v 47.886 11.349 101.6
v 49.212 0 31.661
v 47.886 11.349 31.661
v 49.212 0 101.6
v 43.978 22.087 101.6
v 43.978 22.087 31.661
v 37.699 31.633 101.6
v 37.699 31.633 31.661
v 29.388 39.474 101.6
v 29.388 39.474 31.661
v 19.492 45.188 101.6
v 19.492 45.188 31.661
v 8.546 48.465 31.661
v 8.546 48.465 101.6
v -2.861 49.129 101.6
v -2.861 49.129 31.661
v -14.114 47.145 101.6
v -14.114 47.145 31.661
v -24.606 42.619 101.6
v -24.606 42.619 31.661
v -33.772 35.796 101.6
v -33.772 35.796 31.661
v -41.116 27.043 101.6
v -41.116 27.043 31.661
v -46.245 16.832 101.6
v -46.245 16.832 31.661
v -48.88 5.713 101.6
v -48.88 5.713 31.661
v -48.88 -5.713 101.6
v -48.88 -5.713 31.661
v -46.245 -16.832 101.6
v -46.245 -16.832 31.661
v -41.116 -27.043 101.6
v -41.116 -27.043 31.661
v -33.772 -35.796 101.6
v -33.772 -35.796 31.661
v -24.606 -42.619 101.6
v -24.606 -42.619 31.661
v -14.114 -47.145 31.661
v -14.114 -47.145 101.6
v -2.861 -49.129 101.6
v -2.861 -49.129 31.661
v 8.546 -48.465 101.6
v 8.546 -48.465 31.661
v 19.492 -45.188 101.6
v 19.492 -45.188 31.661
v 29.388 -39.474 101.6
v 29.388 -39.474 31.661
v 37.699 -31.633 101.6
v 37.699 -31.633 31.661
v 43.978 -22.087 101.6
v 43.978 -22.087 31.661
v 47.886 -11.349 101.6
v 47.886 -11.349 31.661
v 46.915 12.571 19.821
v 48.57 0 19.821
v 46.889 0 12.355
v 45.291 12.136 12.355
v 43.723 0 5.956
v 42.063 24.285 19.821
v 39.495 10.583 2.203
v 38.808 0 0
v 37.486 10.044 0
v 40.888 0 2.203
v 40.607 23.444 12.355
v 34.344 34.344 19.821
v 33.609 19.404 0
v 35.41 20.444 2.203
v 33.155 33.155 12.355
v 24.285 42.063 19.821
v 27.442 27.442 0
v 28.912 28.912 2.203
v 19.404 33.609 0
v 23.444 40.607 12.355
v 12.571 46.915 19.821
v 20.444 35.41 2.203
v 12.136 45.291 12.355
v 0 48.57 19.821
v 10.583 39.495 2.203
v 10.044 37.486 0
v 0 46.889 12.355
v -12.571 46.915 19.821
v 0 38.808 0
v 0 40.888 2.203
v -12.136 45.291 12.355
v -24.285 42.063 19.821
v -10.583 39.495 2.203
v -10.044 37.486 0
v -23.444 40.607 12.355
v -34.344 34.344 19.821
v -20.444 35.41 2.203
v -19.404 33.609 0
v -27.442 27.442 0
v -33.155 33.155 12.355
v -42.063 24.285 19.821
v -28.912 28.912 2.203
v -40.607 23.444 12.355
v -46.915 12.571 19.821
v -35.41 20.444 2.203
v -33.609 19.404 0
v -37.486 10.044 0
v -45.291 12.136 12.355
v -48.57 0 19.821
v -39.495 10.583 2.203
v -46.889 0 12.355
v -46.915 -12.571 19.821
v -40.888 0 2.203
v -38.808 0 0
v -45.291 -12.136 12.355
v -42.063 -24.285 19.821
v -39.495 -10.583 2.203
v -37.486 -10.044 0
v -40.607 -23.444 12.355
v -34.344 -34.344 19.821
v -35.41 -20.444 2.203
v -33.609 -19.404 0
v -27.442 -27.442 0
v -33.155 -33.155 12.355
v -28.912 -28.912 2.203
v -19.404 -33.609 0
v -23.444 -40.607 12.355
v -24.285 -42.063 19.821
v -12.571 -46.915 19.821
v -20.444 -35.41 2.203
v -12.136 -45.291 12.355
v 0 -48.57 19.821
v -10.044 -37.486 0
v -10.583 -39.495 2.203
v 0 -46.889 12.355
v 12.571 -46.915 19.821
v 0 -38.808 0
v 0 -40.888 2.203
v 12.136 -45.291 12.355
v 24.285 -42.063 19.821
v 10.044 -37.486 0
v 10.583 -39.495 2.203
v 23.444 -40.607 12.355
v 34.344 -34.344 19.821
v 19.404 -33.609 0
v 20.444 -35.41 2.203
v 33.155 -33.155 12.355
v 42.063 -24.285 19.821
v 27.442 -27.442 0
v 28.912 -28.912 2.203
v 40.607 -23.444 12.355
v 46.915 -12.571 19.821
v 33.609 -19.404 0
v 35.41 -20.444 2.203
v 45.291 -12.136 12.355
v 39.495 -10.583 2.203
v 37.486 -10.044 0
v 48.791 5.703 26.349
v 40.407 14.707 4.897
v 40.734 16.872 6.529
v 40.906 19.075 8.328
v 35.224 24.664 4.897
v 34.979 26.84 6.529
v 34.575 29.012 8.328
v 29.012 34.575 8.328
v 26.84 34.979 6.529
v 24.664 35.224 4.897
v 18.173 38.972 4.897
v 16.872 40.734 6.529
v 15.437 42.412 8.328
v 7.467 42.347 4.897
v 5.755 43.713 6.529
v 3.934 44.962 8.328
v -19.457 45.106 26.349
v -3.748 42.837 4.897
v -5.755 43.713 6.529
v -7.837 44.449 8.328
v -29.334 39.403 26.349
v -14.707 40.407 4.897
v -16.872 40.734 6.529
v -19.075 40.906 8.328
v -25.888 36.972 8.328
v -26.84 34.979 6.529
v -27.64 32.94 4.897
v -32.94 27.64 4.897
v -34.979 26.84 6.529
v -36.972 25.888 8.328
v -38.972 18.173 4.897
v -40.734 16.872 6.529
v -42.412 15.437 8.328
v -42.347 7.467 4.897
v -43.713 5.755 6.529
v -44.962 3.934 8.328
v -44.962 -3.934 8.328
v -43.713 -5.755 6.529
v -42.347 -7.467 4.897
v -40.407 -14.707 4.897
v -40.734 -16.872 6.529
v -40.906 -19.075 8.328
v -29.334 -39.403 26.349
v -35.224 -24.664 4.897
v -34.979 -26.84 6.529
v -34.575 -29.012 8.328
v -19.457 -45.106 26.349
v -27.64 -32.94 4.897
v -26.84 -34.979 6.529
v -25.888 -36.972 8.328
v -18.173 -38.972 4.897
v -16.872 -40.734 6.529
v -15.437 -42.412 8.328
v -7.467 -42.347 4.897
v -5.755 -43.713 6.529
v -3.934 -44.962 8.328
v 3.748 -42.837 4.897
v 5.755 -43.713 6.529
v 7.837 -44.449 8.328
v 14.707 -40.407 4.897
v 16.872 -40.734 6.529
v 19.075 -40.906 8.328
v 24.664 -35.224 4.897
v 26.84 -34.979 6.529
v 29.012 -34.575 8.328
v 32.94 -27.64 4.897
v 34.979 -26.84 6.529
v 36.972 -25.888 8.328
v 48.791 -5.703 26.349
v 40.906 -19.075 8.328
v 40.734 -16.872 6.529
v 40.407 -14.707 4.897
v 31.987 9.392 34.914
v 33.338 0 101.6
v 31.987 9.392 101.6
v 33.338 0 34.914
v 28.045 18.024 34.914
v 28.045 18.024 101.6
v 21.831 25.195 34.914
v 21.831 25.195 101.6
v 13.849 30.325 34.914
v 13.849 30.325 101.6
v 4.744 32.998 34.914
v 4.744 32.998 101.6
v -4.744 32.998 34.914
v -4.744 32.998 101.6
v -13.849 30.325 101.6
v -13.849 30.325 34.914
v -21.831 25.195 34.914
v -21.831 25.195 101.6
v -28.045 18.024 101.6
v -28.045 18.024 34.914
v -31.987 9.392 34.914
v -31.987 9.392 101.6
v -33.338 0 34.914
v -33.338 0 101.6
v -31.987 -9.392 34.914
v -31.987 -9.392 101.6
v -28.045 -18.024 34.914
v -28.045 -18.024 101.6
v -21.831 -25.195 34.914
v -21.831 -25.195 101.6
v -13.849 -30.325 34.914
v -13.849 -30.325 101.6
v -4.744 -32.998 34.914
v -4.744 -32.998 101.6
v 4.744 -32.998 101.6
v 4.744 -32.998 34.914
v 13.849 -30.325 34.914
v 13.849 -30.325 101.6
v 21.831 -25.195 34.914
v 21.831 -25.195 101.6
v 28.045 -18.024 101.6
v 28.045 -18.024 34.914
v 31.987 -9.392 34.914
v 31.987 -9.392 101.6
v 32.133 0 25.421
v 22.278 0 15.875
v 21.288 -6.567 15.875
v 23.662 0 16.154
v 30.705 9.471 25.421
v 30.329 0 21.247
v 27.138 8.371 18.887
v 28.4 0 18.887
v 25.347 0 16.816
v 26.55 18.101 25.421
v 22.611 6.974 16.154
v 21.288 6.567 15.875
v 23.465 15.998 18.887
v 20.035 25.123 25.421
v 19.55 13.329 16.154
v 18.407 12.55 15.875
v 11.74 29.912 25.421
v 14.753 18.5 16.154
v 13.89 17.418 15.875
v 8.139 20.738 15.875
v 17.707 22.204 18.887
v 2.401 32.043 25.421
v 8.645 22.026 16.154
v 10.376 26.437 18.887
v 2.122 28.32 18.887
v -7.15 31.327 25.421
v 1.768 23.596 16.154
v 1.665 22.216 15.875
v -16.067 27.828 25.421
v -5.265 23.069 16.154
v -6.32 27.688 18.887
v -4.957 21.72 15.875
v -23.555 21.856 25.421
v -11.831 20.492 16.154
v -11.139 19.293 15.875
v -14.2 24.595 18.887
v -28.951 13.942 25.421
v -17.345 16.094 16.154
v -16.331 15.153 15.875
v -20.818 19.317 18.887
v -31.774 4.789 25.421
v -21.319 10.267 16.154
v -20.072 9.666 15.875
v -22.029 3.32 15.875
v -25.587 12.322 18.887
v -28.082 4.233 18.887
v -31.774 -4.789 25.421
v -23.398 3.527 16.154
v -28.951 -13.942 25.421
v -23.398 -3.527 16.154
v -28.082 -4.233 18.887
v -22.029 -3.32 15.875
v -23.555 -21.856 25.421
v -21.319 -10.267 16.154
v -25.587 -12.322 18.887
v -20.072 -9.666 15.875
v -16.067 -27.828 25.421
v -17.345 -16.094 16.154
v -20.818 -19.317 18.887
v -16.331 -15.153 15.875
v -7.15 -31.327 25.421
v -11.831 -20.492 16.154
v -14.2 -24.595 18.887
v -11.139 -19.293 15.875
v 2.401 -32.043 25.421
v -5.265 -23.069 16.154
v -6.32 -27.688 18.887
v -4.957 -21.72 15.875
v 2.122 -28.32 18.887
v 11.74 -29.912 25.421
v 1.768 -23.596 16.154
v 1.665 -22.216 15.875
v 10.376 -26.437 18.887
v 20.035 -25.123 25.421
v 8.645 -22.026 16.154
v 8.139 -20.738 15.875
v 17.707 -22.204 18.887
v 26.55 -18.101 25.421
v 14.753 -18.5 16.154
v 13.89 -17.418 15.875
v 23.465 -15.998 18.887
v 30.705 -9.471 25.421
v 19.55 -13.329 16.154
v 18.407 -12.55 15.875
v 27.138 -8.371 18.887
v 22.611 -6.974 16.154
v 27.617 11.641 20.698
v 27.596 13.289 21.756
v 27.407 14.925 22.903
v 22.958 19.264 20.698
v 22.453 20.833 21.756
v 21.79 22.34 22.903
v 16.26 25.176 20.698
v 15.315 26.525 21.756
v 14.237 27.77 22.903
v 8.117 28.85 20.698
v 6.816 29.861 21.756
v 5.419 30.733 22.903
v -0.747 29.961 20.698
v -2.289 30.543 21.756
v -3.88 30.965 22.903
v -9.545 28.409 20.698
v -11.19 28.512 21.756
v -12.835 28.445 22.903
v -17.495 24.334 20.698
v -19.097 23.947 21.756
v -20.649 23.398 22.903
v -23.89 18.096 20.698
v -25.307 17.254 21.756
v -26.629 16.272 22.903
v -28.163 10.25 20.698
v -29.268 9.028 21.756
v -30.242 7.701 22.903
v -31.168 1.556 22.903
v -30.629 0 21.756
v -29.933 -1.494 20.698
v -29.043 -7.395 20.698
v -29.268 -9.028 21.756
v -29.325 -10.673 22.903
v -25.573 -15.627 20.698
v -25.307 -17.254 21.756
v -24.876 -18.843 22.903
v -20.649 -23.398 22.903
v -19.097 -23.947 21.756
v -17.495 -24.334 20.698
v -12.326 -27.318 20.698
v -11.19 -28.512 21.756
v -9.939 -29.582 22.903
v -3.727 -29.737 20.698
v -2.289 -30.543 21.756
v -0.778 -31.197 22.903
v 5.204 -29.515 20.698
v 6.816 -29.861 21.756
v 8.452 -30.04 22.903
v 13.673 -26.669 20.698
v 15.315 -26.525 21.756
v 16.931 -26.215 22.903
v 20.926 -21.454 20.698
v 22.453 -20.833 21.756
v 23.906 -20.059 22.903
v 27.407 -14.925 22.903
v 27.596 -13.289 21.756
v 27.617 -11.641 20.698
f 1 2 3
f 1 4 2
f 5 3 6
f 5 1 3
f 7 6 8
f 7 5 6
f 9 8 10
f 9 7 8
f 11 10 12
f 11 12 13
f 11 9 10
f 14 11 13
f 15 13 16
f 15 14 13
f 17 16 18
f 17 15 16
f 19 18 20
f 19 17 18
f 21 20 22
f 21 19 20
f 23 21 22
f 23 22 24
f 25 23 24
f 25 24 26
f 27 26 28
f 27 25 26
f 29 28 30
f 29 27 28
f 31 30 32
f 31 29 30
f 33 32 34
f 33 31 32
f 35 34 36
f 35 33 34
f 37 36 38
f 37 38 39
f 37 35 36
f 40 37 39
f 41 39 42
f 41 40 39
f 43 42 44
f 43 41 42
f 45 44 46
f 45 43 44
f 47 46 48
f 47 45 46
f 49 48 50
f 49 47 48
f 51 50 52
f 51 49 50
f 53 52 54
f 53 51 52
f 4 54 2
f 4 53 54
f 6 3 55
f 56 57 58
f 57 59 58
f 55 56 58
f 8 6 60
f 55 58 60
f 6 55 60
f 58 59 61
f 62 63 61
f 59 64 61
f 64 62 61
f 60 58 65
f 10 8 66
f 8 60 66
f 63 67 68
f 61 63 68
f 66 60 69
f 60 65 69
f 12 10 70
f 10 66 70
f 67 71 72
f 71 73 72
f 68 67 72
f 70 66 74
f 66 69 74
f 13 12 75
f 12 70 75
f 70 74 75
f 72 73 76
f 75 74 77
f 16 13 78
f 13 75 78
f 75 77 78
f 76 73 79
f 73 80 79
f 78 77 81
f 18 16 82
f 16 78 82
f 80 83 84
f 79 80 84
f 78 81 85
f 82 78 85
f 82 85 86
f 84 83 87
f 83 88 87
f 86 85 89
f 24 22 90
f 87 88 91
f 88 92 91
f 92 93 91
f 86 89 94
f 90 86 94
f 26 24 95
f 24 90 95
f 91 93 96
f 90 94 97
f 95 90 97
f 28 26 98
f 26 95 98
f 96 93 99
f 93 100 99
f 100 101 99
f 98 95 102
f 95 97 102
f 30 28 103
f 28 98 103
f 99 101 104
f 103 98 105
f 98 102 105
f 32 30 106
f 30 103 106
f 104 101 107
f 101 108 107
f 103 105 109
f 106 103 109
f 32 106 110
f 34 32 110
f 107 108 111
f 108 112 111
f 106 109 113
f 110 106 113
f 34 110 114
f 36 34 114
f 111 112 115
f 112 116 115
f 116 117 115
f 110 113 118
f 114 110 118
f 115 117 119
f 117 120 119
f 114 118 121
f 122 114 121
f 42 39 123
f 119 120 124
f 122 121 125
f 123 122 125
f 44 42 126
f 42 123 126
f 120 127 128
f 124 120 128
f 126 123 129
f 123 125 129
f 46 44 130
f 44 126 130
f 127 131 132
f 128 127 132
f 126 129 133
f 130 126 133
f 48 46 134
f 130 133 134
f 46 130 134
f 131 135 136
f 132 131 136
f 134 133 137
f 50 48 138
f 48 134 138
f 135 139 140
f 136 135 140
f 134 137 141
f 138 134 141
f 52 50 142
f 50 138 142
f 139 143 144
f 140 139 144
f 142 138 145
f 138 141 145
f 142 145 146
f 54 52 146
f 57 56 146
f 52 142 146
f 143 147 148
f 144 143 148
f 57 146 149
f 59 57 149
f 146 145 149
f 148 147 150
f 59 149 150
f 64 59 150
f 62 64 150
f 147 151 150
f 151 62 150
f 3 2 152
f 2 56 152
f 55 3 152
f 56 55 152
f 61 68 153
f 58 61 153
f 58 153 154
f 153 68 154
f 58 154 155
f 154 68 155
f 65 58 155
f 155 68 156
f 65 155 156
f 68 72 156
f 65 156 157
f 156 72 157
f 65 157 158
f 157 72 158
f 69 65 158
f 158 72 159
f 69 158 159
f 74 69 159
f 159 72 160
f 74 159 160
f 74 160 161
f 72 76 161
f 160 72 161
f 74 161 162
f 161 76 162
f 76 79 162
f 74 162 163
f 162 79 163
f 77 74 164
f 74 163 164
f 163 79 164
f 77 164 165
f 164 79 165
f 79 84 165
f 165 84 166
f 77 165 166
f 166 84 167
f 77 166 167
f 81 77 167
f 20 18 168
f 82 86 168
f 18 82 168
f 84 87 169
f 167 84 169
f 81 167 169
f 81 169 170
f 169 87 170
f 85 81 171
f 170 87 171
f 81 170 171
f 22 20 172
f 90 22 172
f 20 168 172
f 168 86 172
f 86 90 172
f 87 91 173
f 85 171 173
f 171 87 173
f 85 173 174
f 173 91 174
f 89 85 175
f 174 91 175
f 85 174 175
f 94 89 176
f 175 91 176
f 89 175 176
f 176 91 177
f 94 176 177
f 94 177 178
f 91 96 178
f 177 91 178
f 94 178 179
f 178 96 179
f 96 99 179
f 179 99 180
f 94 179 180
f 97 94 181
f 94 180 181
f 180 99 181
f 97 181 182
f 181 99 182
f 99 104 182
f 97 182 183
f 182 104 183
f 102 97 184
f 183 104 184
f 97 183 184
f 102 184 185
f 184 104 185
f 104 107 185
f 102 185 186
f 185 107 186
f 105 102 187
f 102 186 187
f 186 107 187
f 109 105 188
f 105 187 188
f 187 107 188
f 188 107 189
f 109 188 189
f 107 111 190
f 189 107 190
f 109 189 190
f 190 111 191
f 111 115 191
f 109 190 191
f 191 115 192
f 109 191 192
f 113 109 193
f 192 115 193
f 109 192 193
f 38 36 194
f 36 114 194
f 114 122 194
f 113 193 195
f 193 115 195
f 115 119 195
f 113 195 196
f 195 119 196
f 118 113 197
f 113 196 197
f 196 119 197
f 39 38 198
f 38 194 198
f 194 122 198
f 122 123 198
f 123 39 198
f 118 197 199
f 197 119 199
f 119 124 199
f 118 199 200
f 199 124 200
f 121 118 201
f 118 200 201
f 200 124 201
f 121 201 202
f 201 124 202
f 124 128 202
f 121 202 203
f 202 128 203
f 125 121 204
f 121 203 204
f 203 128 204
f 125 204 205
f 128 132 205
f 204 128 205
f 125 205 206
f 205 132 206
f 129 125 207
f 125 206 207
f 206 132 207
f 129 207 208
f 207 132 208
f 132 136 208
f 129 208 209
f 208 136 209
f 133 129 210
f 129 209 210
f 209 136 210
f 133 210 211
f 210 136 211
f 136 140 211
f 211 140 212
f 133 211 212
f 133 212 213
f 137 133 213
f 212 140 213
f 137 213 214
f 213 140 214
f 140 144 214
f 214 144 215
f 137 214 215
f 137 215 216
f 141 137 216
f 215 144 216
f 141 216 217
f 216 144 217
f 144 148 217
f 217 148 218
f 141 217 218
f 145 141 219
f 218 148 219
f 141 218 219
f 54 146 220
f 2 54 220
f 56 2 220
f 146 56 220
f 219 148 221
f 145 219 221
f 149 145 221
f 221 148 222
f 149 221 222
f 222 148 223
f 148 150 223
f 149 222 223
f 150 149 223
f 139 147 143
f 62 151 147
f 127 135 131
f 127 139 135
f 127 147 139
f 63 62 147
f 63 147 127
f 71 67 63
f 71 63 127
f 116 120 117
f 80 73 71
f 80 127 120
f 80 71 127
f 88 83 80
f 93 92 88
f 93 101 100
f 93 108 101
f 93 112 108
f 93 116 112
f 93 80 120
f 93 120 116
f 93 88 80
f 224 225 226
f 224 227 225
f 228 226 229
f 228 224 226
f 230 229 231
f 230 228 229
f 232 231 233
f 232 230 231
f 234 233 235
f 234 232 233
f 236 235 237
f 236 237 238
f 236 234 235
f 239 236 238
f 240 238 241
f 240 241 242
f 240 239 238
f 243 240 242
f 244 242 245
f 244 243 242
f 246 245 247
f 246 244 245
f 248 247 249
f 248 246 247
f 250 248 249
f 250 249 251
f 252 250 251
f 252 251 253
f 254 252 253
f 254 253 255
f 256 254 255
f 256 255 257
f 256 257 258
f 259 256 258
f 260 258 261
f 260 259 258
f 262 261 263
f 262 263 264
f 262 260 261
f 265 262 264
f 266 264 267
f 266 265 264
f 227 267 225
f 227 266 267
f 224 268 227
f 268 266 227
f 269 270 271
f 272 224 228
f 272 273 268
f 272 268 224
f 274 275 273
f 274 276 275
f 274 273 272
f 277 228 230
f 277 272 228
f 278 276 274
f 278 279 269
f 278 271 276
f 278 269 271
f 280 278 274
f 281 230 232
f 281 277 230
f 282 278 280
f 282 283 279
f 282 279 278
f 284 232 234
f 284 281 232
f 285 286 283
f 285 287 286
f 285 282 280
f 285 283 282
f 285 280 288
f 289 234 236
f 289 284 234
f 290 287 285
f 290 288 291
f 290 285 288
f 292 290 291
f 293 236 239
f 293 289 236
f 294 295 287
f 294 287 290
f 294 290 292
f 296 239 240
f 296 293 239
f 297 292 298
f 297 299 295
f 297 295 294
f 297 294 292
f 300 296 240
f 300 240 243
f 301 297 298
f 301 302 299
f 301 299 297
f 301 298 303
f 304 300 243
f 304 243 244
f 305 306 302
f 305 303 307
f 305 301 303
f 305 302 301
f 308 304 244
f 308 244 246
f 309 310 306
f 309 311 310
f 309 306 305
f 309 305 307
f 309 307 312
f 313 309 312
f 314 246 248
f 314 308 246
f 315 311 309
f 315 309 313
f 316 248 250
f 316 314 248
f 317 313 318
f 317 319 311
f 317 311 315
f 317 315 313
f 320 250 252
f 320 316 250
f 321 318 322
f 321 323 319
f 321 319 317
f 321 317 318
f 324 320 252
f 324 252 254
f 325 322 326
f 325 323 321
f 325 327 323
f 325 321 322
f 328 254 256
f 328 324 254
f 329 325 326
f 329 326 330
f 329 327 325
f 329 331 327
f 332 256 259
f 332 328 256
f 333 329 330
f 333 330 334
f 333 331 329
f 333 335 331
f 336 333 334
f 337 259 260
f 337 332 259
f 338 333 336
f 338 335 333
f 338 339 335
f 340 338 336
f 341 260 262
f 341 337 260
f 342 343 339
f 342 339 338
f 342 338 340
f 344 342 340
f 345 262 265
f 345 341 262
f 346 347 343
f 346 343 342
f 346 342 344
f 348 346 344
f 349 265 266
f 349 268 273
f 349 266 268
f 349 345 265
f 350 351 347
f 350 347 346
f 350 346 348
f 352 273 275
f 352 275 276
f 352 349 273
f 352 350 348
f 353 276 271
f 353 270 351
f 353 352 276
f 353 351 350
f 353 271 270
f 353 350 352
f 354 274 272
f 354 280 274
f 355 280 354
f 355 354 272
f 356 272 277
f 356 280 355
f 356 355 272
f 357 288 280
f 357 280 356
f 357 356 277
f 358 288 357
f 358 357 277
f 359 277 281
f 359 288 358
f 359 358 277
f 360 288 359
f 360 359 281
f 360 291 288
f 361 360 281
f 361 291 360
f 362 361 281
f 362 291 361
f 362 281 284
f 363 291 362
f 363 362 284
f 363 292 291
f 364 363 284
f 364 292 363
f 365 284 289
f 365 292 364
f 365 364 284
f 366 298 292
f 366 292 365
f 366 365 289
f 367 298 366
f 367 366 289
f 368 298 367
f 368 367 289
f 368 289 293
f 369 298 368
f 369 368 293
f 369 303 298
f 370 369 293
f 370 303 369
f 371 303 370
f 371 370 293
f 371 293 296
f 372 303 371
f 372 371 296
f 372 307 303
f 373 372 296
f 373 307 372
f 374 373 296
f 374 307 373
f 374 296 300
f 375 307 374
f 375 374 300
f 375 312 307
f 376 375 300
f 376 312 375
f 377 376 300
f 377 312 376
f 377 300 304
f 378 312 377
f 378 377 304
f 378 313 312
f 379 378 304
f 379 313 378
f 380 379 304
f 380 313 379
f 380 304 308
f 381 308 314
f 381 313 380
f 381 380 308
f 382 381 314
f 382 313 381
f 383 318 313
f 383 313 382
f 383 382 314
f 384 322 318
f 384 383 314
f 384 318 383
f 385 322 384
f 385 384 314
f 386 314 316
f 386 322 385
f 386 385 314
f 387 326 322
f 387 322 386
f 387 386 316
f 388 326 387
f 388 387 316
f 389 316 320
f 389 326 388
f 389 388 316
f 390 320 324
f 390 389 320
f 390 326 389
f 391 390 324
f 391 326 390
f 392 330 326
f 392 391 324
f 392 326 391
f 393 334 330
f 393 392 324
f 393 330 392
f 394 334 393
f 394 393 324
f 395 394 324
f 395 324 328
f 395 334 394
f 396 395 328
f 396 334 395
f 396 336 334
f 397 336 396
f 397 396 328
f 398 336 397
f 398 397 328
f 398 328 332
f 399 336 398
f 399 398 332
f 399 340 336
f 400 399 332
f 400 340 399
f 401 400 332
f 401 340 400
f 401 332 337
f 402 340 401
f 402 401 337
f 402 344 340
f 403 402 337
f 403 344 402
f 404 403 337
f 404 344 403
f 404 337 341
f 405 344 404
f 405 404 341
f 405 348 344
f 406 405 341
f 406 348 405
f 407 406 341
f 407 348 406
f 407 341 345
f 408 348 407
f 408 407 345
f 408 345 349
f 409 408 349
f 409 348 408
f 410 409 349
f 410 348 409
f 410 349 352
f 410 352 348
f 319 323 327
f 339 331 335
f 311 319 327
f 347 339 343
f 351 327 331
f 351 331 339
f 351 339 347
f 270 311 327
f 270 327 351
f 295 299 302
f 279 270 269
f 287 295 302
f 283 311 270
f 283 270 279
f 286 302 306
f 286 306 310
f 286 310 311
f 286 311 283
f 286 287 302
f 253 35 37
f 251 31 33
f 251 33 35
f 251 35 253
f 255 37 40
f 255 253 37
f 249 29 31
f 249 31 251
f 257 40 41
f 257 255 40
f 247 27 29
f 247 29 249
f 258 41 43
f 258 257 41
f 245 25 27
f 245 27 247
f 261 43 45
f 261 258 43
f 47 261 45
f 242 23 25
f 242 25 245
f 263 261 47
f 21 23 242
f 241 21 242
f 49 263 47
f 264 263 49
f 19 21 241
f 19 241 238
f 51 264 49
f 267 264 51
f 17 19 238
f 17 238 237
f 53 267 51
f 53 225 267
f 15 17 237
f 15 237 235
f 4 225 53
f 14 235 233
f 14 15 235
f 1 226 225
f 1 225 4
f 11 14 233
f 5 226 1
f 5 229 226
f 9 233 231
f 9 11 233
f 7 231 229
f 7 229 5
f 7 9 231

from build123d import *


with BuildPart() as f1:
    # F0 (on Front) → F1 (revolve)
    with BuildSketch(Plane.XZ):
        with BuildLine():
            Line((0, 15.875), (0, 0))
            Line((0, 0), (38.8084338195, 0))
            add(Edge.make_bspline(
                [(49.2125, 31.6614325016), (49.2125, 26.7978290762), (49.0916167773, 10.640561103), (40.193340312, 1.320261391), (38.8084338195, 0)],
                knots=[0, 0, 0, 0, 0.5565481811, 1, 1, 1, 1], degree=3))
            Line((49.2125, 31.6614325016), (49.2125, 101.6))
            Line((49.2125, 101.6), (33.3375, 101.6))
            Line((33.3375, 101.6), (33.3375, 34.9139658104))
            add(Edge.make_bspline(
                [(33.3375, 34.9139658104), (33.3375, 29.2359101374), (31.5263553901, 19.041466207), (23.9405606122, 16.0034213664), (22.2781707294, 15.875)],
                knots=[0, 0, 0, 0, 0.5833323151, 1, 1, 1, 1], degree=3))
            Line((22.2781707294, 15.875), (0, 15.875))
        make_face()
    revolve(axis=Axis((0, 0, 7.9375), (0, 0, 1)))


solid = f1.part
